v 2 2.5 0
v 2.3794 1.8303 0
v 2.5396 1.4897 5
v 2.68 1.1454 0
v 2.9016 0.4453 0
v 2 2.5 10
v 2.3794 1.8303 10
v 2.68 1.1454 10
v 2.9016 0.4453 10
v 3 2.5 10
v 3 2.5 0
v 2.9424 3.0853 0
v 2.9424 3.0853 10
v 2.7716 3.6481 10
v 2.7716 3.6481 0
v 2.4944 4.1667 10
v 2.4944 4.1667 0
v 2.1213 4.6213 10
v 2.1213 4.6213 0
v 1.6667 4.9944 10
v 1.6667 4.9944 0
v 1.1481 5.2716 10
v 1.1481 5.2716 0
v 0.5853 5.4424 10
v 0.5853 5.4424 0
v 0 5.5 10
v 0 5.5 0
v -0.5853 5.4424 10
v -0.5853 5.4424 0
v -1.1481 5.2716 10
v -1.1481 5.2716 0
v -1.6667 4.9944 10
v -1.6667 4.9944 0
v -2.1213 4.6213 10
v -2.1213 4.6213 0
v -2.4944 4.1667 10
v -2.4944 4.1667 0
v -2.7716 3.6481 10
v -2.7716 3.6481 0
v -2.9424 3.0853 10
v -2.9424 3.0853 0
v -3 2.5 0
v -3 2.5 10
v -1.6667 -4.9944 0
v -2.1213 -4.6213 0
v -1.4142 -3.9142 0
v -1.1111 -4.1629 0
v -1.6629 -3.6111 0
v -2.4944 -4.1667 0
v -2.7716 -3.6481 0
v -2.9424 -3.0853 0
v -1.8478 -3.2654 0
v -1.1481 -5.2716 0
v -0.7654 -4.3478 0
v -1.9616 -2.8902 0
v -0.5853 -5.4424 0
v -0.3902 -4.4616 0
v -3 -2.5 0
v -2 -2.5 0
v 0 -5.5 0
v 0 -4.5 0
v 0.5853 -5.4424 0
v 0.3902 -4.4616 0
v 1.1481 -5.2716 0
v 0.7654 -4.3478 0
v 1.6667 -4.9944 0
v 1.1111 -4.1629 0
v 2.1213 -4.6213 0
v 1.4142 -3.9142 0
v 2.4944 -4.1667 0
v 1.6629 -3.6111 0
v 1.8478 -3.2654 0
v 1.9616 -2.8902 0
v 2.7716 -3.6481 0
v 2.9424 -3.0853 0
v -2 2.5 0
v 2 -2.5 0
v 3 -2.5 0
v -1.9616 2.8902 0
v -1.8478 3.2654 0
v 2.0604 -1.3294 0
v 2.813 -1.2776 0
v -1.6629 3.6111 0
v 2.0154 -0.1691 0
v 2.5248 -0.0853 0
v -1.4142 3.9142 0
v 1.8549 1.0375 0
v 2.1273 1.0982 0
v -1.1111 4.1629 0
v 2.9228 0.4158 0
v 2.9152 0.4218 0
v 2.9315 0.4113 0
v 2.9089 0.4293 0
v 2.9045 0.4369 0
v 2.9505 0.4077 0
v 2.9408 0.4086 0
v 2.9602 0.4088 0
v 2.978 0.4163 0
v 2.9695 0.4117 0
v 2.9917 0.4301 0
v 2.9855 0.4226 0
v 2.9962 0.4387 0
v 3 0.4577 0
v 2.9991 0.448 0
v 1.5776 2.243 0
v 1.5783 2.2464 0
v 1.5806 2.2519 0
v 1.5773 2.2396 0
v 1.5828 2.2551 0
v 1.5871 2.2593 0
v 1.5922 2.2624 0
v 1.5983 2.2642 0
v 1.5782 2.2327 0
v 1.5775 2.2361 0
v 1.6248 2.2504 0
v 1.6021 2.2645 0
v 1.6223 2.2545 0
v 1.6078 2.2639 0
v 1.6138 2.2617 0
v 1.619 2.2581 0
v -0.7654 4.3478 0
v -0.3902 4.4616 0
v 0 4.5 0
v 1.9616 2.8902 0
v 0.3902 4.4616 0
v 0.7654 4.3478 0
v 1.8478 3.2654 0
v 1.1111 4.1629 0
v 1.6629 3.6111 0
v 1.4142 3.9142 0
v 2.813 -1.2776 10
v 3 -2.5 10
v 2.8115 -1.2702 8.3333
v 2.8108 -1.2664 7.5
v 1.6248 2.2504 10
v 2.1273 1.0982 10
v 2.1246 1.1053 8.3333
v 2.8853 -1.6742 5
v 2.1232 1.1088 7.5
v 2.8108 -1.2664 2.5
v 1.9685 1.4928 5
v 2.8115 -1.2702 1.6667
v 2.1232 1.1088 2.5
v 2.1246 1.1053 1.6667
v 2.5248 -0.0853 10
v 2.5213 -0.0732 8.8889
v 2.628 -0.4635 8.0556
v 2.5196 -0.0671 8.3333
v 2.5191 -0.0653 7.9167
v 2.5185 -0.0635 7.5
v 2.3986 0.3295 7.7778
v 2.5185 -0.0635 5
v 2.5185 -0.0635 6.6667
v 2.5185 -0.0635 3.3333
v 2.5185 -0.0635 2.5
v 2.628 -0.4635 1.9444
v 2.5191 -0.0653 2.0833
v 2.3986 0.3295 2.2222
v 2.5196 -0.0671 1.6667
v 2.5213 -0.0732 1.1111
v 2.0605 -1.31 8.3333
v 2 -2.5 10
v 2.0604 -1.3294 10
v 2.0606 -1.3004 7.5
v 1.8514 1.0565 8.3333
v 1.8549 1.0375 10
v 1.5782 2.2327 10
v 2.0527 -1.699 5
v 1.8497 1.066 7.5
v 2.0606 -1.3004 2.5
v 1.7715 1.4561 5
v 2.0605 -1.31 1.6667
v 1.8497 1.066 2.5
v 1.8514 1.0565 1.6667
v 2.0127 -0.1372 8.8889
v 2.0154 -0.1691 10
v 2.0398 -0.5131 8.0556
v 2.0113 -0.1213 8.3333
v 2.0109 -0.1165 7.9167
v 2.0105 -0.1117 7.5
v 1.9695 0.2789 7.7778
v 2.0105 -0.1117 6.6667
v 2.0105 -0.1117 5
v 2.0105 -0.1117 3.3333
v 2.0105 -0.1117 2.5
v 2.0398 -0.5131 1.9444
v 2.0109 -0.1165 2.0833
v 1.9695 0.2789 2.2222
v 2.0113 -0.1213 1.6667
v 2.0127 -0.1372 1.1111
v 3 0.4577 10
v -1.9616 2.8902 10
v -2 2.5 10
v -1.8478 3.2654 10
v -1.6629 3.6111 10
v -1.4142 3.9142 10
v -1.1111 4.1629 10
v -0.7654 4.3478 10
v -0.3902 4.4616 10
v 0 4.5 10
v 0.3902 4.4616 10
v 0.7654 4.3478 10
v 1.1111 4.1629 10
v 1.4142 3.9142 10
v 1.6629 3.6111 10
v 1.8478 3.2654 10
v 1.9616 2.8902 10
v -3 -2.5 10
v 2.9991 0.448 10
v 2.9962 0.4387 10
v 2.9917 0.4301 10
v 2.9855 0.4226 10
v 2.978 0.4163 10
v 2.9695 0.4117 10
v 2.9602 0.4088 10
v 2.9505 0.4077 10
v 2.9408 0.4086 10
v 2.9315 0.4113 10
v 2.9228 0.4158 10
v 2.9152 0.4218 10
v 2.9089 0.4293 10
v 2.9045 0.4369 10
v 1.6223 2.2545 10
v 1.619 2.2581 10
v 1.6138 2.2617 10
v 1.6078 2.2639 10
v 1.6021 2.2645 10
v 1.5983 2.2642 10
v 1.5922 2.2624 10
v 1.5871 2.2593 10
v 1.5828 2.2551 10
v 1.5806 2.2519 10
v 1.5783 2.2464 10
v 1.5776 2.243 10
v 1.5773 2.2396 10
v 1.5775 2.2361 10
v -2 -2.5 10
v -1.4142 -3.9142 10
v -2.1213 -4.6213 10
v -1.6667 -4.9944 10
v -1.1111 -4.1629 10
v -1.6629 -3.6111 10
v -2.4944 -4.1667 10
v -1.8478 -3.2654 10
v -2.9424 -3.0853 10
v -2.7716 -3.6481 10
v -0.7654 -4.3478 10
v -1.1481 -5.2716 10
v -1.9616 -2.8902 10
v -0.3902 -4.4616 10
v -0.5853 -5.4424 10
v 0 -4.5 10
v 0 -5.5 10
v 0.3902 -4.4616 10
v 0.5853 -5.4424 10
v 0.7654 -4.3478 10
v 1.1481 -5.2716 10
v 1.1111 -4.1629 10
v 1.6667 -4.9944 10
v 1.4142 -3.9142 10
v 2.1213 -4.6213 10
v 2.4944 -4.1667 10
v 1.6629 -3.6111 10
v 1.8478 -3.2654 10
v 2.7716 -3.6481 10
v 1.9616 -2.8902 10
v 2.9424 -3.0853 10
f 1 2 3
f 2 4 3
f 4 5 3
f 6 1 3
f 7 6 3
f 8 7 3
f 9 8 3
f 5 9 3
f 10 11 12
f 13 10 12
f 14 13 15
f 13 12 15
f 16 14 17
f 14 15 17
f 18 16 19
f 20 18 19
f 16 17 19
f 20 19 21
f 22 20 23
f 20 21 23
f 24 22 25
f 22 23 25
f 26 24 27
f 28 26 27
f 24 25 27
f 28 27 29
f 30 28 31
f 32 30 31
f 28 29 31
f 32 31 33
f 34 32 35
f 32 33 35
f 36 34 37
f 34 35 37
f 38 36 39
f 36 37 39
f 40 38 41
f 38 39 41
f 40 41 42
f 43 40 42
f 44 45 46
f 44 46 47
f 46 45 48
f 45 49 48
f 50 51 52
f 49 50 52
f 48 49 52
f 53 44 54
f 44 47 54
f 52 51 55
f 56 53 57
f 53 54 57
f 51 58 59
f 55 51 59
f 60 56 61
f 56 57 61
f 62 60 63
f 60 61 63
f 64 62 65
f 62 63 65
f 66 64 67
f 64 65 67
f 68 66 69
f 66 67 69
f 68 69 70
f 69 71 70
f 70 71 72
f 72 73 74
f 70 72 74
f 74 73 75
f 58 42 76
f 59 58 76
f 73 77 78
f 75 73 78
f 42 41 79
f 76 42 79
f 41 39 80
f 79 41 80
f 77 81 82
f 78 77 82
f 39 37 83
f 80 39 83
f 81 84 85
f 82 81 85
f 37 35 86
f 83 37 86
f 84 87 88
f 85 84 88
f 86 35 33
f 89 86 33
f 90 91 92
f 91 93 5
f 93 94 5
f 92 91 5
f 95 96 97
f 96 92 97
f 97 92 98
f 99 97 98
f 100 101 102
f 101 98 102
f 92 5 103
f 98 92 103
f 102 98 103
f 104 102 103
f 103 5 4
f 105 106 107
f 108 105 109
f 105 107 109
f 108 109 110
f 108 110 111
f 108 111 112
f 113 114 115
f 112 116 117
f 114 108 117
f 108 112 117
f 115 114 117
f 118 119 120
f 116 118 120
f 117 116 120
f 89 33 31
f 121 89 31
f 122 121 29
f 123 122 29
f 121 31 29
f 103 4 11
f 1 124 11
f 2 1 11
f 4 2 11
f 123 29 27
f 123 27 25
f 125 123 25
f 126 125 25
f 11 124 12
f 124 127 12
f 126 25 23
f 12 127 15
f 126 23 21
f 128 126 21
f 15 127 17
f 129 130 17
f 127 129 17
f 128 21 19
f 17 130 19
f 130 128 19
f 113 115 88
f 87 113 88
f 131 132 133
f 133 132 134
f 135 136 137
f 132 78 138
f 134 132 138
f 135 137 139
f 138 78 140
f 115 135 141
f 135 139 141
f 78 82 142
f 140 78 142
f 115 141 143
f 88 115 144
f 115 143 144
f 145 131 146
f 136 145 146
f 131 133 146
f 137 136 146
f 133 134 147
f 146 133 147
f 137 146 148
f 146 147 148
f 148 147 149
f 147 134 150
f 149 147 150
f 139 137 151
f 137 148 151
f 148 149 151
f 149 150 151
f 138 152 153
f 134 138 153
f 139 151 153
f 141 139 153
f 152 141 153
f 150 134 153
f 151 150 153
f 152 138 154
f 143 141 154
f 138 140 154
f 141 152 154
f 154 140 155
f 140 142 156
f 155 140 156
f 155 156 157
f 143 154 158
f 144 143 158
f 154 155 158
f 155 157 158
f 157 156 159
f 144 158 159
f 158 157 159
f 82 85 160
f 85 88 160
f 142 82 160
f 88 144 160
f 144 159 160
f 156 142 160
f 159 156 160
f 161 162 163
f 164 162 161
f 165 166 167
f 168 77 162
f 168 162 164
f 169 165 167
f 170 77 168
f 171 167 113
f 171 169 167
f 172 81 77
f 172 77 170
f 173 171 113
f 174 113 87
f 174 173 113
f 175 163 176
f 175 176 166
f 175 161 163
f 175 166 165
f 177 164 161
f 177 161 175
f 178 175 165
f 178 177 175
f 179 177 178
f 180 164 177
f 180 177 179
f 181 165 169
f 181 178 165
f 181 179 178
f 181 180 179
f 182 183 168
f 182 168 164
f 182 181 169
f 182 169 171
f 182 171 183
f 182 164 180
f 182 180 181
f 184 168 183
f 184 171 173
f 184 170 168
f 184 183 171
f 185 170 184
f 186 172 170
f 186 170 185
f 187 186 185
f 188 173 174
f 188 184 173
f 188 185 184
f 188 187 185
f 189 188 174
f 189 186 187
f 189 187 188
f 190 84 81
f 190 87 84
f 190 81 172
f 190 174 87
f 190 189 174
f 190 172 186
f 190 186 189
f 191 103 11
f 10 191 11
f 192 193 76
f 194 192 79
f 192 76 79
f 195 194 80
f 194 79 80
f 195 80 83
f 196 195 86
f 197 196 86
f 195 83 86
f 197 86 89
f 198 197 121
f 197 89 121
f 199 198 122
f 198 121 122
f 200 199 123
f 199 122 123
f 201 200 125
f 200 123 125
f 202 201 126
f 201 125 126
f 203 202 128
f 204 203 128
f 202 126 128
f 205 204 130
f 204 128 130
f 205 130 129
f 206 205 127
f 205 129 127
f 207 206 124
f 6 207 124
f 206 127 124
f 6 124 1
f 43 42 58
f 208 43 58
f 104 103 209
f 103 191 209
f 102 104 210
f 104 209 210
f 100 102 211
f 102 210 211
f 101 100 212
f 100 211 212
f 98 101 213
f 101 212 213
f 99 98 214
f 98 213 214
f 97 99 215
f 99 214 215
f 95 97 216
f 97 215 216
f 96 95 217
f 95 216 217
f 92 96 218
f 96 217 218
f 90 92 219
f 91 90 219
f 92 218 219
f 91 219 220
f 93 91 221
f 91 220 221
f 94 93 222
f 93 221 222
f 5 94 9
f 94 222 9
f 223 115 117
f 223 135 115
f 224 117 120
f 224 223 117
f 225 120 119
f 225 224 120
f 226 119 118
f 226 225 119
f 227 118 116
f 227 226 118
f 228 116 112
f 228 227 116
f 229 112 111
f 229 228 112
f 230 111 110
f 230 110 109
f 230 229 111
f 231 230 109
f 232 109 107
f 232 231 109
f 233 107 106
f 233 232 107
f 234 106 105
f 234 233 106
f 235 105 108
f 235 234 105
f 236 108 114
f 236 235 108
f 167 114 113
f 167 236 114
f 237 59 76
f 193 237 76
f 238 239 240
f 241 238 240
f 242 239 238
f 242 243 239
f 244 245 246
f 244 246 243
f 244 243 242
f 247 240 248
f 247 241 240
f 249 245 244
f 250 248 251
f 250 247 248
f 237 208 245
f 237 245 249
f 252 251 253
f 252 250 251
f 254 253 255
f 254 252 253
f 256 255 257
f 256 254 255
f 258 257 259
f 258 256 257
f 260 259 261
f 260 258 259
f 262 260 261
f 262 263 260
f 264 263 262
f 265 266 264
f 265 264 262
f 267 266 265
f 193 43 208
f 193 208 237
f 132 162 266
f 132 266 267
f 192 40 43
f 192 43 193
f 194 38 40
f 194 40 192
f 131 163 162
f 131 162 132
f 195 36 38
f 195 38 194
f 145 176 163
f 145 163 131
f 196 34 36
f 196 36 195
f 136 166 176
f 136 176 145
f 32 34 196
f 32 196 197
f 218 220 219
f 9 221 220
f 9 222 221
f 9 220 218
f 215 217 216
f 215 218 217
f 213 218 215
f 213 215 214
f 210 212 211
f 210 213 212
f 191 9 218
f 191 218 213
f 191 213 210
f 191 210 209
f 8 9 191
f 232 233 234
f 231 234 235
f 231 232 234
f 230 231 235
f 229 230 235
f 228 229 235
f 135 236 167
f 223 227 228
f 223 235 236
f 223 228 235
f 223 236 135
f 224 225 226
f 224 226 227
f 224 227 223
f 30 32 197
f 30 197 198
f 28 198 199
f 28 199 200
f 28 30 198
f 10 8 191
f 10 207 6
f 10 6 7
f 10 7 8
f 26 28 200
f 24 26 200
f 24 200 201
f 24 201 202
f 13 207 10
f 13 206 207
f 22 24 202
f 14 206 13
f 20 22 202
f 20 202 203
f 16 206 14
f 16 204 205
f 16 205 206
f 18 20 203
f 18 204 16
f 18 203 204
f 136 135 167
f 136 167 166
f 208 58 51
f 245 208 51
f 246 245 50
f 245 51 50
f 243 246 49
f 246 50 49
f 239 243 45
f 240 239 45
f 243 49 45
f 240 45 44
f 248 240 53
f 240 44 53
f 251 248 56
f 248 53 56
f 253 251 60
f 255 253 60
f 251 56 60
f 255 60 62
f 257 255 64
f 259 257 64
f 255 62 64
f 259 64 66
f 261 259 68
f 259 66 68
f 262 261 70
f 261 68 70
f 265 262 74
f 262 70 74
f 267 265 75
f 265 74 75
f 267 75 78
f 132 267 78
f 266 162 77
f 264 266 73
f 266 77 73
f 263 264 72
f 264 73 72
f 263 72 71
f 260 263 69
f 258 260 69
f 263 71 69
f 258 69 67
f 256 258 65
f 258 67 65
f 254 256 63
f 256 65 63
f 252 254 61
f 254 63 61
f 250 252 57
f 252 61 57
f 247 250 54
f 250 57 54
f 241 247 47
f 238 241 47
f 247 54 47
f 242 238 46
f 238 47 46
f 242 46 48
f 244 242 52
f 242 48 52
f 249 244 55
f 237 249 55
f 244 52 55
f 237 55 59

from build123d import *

# Parameters (mm, degrees)
BOSS_EXTRUDE1_DEPTH = 10
FILLET1_R           = 0.025
FILLET2_R           = 0.05


with BuildPart() as part:
    # Sketch1 → Boss-Extrude1 (new body)
    with BuildSketch(Plane.XY):
        with BuildLine():
            ThreePointArc((2, -2.5), (0, -4.5), (-2, -2.5))
            Line((-2, -2.5), (-2, 2.5))
            ThreePointArc((-2, 2.5), (0, 4.5), (2, 2.5))
            add(Edge.make_bspline(
                [(2, 2.5), (2.759271996, 1.299931224), (3, 0)],
                knots=[0, 0, 0, 0.518543991, 0.518543991, 0.518543991], degree=2))
            Line((3, 0), (3, 2.5))
            ThreePointArc((3, 2.5), (0, 5.5), (-3, 2.5))
            Line((-3, 2.5), (-3, -2.5))
            ThreePointArc((-3, -2.5), (0, -5.5), (3, -2.5))
            add(Edge.make_bspline(
                [(3, -2.5), (2.709402649, 0.136566945), (1.5, 2.5)],
                knots=[0, 0, 0, 1, 1, 1], degree=2))
            add(Edge.make_bspline(
                [(2, -2.5), (2.245145169, 0.049029034), (1.5, 2.5)],
                knots=[0, 0, 0, 1, 1, 1], degree=2))
        make_face()
    extrude(amount=BOSS_EXTRUDE1_DEPTH)

    # Fillet1
    fillet1_edges = [part.edges().sort_by_distance(p)[0] for p in [
        (1.5, 2.5, 5),
    ]]
    fillet(fillet1_edges, radius=FILLET1_R)

    # Fillet2
    fillet2_edges = [part.edges().sort_by_distance(p)[0] for p in [
        (3, 0, 5),
    ]]
    fillet(fillet2_edges, radius=FILLET2_R)


solid = part.part
